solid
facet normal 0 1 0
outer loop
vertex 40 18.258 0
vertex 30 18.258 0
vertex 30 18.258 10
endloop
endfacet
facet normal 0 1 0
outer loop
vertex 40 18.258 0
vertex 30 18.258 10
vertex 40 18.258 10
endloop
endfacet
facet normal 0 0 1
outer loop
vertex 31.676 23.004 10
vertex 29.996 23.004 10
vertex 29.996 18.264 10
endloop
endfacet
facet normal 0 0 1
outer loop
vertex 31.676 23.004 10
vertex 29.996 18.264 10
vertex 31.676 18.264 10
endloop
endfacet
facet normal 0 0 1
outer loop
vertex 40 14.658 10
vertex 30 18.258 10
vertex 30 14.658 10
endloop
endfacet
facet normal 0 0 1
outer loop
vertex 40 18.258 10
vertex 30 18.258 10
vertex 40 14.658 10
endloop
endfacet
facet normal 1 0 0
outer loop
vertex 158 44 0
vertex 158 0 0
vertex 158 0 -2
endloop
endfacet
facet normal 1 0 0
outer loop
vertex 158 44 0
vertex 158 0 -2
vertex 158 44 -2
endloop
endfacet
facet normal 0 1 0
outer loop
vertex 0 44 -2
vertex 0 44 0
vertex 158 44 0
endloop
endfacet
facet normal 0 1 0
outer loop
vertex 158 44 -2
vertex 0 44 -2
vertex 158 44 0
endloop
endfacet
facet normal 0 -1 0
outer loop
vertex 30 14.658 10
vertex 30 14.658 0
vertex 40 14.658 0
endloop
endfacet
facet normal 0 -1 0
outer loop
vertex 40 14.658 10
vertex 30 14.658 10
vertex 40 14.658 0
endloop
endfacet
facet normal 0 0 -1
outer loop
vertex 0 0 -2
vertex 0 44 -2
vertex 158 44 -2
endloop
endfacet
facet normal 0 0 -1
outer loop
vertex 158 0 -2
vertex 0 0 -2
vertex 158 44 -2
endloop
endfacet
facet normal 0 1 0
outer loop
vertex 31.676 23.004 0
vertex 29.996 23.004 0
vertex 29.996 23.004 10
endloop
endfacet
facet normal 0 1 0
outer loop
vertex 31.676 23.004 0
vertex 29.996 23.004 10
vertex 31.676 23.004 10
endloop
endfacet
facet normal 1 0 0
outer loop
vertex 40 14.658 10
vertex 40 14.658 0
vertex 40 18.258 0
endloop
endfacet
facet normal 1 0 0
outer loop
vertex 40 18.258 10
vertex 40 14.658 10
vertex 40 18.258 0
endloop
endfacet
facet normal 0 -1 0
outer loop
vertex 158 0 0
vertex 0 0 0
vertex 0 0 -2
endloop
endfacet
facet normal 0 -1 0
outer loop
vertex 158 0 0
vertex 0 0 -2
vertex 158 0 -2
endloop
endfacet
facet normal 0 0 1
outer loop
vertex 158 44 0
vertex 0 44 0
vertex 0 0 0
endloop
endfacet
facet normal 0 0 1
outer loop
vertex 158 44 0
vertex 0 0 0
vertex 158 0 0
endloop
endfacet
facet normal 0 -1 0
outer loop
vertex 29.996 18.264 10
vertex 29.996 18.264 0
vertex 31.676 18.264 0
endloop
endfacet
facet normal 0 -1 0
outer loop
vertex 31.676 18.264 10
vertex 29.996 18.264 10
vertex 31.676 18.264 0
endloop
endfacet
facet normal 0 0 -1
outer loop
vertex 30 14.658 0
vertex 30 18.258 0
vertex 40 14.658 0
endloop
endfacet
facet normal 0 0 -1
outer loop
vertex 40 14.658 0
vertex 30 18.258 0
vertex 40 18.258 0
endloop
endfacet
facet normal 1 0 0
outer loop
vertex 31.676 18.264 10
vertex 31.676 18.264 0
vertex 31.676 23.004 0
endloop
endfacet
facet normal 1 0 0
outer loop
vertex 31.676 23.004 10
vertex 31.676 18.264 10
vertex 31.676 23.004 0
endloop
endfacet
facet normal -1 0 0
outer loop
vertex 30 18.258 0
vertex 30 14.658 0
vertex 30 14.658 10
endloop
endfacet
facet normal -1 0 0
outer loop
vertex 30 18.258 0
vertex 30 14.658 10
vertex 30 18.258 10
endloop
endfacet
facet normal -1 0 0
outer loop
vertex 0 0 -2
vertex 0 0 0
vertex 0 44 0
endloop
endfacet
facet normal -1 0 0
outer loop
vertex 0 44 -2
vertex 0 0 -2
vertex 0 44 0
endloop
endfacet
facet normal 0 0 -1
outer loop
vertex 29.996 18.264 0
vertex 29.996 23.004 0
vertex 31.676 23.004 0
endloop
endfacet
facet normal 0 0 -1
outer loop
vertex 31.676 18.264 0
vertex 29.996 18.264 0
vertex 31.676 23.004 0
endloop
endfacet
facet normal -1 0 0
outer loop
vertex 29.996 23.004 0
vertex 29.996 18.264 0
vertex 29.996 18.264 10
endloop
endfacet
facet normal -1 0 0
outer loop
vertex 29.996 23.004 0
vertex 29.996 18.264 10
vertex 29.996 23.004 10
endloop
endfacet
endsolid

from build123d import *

# Parameters (mm, degrees)
SKETCH004_W      = 158
SKETCH004_H      = 44
PAD_DEPTH        = 2
SKETCH005_W      = 10
SKETCH005_H      = 3.6
EXTRUDE_DEPTH    = 10
SKETCH006_W      = 1.68
SKETCH006_H      = 4.74
EXTRUDE001_DEPTH = 10


with BuildPart() as body:
    # Sketch004 → Pad (new body)
    with BuildSketch(Plane.XY):
        with Locations((79, 22)):
            Rectangle(SKETCH004_W, SKETCH004_H)
    extrude(amount=-PAD_DEPTH)


with BuildPart() as extrude_body:
    # Sketch005 → Extrude (new body)
    with BuildSketch(Plane.XY):
        with Locations((35, 16.458471)):
            Rectangle(SKETCH005_W, SKETCH005_H)
    extrude(amount=EXTRUDE_DEPTH)


with BuildPart() as extrude001:
    # Sketch006 → Extrude001 (new body)
    with BuildSketch(Plane.XY):
        with Locations((30.835808, 20.634154)):
            Rectangle(SKETCH006_W, SKETCH006_H)
    extrude(amount=EXTRUDE001_DEPTH)


solid = Compound([body.part, extrude_body.part, extrude001.part])
